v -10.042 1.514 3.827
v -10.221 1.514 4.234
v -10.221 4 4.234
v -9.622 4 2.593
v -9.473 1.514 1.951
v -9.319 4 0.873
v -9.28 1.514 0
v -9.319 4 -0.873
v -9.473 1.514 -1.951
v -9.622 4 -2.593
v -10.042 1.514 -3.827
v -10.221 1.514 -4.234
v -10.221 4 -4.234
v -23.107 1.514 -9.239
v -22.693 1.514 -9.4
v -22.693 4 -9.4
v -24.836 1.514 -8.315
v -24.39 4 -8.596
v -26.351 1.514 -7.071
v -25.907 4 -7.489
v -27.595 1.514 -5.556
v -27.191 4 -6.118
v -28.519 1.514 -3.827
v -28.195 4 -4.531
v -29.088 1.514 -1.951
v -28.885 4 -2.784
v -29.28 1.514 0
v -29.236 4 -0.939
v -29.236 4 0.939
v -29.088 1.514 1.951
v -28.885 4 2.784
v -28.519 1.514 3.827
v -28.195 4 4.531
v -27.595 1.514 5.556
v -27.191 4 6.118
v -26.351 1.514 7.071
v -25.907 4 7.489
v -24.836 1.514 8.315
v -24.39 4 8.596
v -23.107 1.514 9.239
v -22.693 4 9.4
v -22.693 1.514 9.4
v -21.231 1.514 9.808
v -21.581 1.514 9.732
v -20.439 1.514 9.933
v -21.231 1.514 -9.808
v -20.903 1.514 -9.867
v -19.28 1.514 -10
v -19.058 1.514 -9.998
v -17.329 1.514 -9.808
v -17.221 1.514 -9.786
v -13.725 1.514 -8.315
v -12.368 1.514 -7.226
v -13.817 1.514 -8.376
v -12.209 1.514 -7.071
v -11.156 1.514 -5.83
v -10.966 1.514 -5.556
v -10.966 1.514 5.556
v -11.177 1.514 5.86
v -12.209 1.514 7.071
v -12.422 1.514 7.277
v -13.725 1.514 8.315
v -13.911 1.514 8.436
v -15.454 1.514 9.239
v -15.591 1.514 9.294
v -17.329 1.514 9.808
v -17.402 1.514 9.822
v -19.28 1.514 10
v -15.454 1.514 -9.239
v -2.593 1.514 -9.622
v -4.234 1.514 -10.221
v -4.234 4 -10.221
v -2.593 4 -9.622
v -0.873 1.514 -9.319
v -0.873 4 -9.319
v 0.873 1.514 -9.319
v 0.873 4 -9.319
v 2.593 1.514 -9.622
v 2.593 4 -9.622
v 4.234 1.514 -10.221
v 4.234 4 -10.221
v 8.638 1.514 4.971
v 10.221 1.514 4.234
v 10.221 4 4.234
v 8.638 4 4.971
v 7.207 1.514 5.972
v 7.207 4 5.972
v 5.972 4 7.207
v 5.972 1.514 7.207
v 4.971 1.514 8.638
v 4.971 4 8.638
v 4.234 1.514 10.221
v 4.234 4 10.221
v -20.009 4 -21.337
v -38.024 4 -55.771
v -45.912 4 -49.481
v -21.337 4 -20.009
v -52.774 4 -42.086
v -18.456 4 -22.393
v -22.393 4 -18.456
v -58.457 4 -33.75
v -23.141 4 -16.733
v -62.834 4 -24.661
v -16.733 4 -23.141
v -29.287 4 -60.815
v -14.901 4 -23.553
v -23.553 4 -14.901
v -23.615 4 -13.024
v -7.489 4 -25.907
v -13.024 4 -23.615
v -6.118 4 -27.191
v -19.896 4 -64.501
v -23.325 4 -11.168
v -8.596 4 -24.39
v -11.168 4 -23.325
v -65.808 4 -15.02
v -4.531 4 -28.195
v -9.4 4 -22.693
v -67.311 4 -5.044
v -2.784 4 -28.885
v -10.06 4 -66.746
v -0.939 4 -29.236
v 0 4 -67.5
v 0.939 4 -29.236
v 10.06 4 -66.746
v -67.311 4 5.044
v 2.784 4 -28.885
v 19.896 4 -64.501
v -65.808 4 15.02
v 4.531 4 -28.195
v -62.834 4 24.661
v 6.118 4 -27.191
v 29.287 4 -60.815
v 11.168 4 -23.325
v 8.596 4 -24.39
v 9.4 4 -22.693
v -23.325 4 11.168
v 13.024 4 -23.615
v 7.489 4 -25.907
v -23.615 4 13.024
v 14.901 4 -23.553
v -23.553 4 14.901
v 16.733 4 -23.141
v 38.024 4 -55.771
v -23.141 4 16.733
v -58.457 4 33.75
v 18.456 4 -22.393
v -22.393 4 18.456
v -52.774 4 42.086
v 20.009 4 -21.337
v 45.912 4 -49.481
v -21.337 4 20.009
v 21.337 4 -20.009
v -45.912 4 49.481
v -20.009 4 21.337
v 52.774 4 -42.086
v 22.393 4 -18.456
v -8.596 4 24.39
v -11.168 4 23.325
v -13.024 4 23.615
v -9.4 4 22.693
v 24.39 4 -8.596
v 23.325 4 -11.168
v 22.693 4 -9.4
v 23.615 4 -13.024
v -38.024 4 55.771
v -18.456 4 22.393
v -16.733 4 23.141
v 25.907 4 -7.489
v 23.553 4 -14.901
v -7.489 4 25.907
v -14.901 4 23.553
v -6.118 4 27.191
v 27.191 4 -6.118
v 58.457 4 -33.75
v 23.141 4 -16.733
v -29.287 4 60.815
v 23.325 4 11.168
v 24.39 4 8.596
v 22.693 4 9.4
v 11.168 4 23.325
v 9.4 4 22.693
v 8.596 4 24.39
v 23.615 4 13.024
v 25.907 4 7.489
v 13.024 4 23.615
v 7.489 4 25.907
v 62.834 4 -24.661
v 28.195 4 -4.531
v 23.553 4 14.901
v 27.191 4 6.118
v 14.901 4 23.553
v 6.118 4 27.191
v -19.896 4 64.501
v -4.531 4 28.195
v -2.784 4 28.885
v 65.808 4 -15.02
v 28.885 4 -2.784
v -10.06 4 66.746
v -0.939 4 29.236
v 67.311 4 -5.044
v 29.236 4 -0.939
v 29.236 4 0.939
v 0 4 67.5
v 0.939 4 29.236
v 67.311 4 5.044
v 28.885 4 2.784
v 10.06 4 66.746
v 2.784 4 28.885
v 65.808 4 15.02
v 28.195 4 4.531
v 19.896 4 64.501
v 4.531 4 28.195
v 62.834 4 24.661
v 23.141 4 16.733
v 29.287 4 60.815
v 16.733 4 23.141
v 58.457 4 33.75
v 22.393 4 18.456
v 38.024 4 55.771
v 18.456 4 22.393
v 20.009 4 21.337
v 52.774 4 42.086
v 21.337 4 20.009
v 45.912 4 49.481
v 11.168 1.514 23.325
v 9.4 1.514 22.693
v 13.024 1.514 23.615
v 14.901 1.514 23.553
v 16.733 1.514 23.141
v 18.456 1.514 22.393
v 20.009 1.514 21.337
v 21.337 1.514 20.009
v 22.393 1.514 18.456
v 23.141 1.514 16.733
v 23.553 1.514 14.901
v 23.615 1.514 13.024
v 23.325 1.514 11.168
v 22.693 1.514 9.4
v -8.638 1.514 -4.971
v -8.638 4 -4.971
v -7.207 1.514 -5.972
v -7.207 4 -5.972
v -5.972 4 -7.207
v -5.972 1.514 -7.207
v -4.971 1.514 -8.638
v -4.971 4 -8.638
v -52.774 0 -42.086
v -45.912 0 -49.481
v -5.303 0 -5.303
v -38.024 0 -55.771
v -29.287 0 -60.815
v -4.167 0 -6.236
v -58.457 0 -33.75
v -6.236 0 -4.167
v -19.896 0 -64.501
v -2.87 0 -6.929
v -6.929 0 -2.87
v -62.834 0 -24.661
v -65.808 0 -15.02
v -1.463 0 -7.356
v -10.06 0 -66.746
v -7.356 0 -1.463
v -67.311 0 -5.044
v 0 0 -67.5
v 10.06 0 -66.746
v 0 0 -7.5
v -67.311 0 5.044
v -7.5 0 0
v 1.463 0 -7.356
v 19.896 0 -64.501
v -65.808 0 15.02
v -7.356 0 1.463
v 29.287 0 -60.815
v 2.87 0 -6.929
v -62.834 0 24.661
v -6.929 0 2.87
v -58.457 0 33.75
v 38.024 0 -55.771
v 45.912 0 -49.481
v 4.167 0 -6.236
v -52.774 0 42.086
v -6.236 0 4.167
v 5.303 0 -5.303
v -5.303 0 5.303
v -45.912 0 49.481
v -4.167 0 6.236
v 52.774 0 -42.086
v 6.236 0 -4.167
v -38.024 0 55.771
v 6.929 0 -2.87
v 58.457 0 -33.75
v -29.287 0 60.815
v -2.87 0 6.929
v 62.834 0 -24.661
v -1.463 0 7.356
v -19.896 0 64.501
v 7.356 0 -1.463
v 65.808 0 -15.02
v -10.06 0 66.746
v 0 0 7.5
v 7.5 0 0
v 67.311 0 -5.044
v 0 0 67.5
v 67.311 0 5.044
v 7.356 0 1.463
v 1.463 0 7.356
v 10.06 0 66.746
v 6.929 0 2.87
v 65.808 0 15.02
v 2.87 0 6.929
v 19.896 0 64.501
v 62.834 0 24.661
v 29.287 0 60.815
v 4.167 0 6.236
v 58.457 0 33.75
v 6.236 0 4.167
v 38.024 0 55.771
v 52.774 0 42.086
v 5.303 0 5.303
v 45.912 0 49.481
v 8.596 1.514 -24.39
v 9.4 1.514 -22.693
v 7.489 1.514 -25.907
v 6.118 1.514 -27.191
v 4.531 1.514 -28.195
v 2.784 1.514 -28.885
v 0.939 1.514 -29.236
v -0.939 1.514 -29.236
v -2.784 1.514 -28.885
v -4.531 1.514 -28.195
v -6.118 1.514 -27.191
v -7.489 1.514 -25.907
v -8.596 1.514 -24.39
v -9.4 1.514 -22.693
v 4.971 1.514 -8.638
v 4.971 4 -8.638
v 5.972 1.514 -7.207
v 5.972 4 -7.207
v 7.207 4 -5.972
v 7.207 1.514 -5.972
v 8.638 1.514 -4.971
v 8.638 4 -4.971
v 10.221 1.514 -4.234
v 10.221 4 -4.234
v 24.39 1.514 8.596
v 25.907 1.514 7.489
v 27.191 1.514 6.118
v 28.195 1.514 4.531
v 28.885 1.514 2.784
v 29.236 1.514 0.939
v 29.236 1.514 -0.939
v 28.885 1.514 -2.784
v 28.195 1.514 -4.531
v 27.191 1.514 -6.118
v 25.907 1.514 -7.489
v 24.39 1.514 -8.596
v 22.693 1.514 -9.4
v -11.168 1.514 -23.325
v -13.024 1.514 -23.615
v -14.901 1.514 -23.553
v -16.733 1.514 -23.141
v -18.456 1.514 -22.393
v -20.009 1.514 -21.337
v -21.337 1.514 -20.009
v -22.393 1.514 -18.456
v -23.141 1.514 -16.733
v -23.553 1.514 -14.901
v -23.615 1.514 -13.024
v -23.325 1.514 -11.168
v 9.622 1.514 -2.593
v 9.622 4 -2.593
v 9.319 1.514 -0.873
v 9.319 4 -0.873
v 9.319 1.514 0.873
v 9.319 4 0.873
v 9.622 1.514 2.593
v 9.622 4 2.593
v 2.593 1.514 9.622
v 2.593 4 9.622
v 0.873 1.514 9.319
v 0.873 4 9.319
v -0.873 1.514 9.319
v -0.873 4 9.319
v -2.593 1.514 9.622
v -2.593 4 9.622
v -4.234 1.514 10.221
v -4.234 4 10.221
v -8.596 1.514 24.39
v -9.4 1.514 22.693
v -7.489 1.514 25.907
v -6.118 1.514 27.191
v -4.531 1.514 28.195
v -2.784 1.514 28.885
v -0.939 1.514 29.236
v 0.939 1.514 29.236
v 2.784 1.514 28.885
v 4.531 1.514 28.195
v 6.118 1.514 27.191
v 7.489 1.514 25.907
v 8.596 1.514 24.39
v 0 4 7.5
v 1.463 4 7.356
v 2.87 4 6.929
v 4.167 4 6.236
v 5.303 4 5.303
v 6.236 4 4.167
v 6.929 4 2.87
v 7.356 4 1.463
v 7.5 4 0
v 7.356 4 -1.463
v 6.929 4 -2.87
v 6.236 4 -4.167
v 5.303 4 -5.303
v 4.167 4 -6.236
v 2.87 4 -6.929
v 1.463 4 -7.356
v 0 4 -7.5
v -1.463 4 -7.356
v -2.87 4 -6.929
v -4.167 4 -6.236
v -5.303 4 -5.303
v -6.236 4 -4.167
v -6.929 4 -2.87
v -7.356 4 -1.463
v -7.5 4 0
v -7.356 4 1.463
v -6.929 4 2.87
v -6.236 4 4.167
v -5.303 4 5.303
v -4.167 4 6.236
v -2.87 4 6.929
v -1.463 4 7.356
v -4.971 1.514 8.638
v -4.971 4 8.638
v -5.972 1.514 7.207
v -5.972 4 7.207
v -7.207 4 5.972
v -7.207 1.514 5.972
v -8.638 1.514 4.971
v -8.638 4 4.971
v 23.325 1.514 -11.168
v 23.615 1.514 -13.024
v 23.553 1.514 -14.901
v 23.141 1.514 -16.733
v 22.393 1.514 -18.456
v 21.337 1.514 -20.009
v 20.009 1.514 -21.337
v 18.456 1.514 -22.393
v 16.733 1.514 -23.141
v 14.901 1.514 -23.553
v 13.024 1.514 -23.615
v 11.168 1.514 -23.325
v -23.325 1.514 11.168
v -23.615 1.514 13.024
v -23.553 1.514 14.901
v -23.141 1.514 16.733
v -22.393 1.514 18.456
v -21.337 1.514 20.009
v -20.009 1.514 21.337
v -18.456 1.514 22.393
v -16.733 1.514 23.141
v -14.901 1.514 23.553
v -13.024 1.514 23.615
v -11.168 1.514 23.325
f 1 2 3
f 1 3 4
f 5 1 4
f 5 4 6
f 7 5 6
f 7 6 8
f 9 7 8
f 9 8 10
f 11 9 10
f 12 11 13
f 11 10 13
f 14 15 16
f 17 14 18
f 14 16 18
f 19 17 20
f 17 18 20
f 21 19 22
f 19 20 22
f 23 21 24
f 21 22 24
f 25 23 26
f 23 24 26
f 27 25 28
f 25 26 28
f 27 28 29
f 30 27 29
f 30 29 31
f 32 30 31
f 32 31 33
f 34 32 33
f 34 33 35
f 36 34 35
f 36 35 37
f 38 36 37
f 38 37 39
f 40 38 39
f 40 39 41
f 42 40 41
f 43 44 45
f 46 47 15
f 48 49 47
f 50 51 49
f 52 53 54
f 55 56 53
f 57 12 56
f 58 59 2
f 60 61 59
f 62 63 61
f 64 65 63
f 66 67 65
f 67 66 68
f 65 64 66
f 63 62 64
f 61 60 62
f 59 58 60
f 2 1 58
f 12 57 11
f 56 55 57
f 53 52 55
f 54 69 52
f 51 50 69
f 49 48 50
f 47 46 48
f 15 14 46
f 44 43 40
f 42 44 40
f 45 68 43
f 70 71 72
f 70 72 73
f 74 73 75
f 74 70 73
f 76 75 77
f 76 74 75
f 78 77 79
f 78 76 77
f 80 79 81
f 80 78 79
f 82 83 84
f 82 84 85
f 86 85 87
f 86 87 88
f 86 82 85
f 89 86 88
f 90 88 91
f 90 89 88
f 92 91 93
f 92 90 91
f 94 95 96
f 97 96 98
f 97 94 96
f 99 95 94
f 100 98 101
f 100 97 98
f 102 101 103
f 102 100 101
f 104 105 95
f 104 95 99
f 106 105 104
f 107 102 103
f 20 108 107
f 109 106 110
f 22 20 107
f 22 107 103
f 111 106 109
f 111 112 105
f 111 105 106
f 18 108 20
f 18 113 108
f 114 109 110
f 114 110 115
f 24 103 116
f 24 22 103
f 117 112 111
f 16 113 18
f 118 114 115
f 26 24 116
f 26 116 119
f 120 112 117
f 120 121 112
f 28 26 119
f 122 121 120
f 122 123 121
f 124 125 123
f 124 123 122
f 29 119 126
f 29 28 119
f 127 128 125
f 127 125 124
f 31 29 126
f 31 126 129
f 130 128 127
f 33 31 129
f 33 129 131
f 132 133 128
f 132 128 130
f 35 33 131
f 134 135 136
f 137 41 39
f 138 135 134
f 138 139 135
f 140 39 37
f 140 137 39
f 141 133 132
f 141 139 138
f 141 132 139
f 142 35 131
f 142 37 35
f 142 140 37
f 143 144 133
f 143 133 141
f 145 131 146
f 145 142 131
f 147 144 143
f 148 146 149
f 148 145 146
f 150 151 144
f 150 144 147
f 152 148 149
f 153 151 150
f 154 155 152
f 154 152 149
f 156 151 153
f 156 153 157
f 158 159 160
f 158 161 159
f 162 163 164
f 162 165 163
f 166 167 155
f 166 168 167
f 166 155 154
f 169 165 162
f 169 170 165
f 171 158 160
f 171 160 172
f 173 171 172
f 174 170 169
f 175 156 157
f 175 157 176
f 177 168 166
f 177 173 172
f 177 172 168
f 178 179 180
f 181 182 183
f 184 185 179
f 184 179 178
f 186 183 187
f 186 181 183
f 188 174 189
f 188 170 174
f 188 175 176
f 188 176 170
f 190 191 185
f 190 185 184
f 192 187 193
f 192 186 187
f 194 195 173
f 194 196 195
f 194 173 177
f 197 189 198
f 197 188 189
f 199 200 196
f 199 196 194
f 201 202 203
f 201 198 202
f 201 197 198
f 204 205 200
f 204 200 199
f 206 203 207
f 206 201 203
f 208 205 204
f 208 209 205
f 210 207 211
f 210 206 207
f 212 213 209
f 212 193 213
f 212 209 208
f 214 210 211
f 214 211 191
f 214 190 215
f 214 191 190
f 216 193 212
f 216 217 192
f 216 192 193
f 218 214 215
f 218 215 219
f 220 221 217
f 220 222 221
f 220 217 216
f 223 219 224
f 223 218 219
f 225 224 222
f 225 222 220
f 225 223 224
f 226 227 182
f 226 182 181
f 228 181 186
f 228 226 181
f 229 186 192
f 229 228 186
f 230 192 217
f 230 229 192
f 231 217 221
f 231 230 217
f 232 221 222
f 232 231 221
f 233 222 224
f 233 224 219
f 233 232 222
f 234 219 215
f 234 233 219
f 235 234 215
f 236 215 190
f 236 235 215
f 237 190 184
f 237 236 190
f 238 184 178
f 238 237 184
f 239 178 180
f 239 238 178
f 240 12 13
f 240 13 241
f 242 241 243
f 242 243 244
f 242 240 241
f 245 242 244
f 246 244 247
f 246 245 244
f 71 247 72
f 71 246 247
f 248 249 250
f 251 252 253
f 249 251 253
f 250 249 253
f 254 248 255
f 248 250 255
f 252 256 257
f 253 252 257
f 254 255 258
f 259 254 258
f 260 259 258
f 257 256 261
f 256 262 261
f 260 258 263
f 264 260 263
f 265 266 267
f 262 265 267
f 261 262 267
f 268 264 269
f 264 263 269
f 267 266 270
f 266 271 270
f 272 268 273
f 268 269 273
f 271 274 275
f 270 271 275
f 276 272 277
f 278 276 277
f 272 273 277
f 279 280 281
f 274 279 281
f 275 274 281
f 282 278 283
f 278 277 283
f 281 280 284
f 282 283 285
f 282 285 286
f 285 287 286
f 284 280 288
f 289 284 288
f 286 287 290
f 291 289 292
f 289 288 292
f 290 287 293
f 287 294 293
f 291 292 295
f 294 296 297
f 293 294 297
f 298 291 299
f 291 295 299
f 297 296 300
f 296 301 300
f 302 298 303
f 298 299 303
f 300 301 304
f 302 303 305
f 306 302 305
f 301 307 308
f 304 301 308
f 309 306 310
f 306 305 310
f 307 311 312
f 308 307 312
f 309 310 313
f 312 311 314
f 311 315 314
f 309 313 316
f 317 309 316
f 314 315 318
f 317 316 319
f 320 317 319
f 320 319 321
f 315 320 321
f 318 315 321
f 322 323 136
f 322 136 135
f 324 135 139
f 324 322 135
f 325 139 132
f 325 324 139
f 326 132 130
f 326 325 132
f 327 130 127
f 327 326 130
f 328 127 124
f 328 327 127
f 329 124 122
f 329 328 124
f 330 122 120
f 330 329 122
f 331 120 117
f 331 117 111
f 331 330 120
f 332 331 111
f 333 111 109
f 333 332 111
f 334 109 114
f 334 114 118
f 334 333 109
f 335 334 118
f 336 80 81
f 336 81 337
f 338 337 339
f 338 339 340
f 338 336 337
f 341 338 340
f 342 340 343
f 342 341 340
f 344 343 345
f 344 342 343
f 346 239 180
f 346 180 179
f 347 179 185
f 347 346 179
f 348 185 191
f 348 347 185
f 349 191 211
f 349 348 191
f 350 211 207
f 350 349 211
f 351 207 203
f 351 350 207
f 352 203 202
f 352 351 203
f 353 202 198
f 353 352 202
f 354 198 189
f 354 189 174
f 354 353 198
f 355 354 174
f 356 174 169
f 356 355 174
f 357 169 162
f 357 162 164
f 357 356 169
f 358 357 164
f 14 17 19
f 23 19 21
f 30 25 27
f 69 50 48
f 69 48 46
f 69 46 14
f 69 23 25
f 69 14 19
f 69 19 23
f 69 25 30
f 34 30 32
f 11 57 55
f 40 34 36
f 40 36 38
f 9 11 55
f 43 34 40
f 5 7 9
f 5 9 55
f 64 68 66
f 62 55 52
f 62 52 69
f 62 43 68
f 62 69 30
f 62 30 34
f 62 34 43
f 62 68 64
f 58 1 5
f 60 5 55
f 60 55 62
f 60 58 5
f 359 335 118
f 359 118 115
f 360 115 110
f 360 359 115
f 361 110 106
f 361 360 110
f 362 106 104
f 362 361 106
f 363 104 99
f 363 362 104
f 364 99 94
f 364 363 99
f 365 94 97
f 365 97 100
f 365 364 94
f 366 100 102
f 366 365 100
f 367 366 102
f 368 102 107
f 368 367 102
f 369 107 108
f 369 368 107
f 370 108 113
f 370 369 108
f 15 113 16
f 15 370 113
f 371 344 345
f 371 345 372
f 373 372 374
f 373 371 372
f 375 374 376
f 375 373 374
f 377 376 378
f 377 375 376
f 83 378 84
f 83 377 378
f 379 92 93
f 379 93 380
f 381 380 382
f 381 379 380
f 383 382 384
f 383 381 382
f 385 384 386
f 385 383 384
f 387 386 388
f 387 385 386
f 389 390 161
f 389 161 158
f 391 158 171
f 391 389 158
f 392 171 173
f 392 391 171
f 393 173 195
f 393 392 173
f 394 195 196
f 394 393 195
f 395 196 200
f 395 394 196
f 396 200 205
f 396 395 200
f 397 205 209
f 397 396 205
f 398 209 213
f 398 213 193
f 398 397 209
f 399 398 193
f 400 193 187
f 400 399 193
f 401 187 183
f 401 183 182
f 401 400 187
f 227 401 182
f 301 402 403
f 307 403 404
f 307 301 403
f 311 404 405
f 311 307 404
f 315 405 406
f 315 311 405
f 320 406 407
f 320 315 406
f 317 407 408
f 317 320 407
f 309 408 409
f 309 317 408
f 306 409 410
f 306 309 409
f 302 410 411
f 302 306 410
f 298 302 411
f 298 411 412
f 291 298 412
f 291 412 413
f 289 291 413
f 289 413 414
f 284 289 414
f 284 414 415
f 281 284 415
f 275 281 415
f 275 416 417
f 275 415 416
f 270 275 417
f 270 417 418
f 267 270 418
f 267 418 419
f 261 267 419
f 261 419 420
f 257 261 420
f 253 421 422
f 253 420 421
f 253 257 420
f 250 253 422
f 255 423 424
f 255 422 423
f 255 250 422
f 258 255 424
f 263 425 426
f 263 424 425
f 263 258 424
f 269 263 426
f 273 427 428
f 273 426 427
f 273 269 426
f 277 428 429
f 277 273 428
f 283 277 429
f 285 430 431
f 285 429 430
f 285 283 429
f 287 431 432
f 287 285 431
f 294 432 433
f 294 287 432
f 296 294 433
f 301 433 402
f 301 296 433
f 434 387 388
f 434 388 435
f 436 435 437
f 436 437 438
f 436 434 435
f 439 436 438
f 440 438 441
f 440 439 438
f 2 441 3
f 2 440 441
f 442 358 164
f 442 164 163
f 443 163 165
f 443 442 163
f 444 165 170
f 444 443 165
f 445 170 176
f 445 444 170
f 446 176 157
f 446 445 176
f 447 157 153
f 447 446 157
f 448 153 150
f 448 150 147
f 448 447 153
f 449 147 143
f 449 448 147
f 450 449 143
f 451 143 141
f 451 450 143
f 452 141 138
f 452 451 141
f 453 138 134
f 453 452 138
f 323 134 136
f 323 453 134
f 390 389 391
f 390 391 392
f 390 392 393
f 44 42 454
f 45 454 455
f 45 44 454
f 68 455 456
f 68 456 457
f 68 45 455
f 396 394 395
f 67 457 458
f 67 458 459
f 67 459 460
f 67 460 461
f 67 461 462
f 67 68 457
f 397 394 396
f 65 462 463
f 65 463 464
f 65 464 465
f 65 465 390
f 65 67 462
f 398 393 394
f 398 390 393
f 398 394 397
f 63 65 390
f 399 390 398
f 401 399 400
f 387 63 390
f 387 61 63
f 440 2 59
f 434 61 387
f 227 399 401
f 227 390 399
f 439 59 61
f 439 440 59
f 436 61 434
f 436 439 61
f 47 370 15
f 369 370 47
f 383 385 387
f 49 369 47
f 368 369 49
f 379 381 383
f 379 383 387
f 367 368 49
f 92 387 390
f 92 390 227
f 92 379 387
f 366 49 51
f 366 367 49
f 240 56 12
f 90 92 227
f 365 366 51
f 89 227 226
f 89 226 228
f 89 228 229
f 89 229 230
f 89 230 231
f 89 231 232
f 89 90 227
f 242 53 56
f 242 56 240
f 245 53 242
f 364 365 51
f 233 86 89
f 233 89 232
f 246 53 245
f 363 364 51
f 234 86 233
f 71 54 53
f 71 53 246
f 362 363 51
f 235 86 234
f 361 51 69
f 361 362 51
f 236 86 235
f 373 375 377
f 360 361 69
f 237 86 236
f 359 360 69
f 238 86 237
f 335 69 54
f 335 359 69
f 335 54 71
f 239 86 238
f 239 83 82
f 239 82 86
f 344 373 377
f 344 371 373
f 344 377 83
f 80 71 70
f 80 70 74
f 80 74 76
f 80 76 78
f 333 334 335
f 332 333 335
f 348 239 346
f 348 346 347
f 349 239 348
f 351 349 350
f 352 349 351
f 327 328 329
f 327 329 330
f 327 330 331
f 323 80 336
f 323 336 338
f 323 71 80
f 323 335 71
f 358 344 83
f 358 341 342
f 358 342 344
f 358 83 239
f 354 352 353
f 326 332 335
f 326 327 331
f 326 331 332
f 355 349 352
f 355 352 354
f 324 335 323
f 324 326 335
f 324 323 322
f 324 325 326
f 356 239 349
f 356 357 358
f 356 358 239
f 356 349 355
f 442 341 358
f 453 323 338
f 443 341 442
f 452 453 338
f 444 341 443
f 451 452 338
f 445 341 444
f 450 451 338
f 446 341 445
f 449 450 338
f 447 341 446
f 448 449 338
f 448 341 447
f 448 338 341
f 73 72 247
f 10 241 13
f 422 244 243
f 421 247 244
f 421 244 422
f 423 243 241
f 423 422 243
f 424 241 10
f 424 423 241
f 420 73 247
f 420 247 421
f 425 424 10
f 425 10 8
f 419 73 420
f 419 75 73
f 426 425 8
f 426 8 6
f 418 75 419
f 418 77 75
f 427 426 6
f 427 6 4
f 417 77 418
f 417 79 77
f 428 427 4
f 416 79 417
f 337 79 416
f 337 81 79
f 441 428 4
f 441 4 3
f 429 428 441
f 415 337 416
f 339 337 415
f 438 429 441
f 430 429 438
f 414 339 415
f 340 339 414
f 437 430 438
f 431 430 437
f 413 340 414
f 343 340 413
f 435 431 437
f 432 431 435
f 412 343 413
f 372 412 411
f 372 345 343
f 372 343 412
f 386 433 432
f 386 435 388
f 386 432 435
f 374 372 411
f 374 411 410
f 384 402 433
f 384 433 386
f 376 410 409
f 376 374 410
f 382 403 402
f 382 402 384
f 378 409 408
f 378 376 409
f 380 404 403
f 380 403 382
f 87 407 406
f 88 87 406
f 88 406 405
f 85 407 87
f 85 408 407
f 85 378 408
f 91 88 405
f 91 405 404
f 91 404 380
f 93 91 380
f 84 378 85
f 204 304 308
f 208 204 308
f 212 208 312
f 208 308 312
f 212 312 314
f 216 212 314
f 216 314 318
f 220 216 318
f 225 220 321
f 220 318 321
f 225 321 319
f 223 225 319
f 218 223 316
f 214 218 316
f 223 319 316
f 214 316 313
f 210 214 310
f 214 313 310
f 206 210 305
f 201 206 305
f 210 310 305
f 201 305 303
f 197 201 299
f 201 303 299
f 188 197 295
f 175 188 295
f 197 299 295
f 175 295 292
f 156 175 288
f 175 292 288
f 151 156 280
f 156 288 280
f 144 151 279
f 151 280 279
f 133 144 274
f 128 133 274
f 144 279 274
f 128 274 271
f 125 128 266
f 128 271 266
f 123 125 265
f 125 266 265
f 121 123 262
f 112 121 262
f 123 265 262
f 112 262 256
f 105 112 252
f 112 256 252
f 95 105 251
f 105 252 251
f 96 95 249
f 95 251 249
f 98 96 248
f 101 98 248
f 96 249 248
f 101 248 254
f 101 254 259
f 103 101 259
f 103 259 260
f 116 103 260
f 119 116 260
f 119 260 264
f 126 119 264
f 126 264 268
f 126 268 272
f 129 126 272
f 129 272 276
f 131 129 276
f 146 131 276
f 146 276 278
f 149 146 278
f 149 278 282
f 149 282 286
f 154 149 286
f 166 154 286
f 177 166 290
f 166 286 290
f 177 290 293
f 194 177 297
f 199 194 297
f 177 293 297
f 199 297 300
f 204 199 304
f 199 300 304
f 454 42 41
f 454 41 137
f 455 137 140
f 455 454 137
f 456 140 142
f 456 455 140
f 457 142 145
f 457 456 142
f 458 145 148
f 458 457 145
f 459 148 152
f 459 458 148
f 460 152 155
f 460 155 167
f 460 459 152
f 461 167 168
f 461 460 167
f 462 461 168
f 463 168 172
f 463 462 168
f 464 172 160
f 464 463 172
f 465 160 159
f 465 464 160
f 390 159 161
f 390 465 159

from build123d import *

# Parameters (mm, degrees)
SKETCH1_R           = 67.5
BOSS_EXTRUDE1_DEPTH = 4
SKETCH2_R           = 7.5
CUT_EXTRUDE1_DEPTH  = 96.543183954
SKETCH3_R           = 10
CUT_EXTRUDE2_DEPTH  = 2.485753536
CIRPATTERN1_COUNT   = 8


with BuildPart() as part:
    # Sketch1 → Boss-Extrude1 (new body)
    with BuildSketch(Plane(origin=(0, 0, 0), x_dir=(1, 0, 0), z_dir=(0, 1, 0))):
        Circle(SKETCH1_R)
    extrude(amount=BOSS_EXTRUDE1_DEPTH)

    # Sketch2 → Cut-Extrude1 (cut, through all)
    with BuildSketch(Plane(origin=(0, 0, 0), x_dir=(1, 0, 0), z_dir=(0, 1, 0))):
        Circle(SKETCH2_R)
    extrude(amount=CUT_EXTRUDE1_DEPTH, mode=Mode.SUBTRACT)

    # Sketch3 → Cut-Extrude2 (cut)
    with BuildSketch(Plane(origin=(0, 4, 0), x_dir=(1, 0, 0), z_dir=(0, 1, 0))):
        with Locations((-19.280397609, 0)):
            Circle(SKETCH3_R)
    cut_extrude2 = extrude(amount=-CUT_EXTRUDE2_DEPTH, mode=Mode.SUBTRACT)

    # CirPattern1: Cut-Extrude2 ×8 about axis
    cirpattern1_axis = Axis((0, 0, 0), (0, 1, 0))
    for i in range(1, CIRPATTERN1_COUNT):
        add(cut_extrude2.rotate(cirpattern1_axis, i * 360 / CIRPATTERN1_COUNT), mode=Mode.SUBTRACT)


solid = part.part
